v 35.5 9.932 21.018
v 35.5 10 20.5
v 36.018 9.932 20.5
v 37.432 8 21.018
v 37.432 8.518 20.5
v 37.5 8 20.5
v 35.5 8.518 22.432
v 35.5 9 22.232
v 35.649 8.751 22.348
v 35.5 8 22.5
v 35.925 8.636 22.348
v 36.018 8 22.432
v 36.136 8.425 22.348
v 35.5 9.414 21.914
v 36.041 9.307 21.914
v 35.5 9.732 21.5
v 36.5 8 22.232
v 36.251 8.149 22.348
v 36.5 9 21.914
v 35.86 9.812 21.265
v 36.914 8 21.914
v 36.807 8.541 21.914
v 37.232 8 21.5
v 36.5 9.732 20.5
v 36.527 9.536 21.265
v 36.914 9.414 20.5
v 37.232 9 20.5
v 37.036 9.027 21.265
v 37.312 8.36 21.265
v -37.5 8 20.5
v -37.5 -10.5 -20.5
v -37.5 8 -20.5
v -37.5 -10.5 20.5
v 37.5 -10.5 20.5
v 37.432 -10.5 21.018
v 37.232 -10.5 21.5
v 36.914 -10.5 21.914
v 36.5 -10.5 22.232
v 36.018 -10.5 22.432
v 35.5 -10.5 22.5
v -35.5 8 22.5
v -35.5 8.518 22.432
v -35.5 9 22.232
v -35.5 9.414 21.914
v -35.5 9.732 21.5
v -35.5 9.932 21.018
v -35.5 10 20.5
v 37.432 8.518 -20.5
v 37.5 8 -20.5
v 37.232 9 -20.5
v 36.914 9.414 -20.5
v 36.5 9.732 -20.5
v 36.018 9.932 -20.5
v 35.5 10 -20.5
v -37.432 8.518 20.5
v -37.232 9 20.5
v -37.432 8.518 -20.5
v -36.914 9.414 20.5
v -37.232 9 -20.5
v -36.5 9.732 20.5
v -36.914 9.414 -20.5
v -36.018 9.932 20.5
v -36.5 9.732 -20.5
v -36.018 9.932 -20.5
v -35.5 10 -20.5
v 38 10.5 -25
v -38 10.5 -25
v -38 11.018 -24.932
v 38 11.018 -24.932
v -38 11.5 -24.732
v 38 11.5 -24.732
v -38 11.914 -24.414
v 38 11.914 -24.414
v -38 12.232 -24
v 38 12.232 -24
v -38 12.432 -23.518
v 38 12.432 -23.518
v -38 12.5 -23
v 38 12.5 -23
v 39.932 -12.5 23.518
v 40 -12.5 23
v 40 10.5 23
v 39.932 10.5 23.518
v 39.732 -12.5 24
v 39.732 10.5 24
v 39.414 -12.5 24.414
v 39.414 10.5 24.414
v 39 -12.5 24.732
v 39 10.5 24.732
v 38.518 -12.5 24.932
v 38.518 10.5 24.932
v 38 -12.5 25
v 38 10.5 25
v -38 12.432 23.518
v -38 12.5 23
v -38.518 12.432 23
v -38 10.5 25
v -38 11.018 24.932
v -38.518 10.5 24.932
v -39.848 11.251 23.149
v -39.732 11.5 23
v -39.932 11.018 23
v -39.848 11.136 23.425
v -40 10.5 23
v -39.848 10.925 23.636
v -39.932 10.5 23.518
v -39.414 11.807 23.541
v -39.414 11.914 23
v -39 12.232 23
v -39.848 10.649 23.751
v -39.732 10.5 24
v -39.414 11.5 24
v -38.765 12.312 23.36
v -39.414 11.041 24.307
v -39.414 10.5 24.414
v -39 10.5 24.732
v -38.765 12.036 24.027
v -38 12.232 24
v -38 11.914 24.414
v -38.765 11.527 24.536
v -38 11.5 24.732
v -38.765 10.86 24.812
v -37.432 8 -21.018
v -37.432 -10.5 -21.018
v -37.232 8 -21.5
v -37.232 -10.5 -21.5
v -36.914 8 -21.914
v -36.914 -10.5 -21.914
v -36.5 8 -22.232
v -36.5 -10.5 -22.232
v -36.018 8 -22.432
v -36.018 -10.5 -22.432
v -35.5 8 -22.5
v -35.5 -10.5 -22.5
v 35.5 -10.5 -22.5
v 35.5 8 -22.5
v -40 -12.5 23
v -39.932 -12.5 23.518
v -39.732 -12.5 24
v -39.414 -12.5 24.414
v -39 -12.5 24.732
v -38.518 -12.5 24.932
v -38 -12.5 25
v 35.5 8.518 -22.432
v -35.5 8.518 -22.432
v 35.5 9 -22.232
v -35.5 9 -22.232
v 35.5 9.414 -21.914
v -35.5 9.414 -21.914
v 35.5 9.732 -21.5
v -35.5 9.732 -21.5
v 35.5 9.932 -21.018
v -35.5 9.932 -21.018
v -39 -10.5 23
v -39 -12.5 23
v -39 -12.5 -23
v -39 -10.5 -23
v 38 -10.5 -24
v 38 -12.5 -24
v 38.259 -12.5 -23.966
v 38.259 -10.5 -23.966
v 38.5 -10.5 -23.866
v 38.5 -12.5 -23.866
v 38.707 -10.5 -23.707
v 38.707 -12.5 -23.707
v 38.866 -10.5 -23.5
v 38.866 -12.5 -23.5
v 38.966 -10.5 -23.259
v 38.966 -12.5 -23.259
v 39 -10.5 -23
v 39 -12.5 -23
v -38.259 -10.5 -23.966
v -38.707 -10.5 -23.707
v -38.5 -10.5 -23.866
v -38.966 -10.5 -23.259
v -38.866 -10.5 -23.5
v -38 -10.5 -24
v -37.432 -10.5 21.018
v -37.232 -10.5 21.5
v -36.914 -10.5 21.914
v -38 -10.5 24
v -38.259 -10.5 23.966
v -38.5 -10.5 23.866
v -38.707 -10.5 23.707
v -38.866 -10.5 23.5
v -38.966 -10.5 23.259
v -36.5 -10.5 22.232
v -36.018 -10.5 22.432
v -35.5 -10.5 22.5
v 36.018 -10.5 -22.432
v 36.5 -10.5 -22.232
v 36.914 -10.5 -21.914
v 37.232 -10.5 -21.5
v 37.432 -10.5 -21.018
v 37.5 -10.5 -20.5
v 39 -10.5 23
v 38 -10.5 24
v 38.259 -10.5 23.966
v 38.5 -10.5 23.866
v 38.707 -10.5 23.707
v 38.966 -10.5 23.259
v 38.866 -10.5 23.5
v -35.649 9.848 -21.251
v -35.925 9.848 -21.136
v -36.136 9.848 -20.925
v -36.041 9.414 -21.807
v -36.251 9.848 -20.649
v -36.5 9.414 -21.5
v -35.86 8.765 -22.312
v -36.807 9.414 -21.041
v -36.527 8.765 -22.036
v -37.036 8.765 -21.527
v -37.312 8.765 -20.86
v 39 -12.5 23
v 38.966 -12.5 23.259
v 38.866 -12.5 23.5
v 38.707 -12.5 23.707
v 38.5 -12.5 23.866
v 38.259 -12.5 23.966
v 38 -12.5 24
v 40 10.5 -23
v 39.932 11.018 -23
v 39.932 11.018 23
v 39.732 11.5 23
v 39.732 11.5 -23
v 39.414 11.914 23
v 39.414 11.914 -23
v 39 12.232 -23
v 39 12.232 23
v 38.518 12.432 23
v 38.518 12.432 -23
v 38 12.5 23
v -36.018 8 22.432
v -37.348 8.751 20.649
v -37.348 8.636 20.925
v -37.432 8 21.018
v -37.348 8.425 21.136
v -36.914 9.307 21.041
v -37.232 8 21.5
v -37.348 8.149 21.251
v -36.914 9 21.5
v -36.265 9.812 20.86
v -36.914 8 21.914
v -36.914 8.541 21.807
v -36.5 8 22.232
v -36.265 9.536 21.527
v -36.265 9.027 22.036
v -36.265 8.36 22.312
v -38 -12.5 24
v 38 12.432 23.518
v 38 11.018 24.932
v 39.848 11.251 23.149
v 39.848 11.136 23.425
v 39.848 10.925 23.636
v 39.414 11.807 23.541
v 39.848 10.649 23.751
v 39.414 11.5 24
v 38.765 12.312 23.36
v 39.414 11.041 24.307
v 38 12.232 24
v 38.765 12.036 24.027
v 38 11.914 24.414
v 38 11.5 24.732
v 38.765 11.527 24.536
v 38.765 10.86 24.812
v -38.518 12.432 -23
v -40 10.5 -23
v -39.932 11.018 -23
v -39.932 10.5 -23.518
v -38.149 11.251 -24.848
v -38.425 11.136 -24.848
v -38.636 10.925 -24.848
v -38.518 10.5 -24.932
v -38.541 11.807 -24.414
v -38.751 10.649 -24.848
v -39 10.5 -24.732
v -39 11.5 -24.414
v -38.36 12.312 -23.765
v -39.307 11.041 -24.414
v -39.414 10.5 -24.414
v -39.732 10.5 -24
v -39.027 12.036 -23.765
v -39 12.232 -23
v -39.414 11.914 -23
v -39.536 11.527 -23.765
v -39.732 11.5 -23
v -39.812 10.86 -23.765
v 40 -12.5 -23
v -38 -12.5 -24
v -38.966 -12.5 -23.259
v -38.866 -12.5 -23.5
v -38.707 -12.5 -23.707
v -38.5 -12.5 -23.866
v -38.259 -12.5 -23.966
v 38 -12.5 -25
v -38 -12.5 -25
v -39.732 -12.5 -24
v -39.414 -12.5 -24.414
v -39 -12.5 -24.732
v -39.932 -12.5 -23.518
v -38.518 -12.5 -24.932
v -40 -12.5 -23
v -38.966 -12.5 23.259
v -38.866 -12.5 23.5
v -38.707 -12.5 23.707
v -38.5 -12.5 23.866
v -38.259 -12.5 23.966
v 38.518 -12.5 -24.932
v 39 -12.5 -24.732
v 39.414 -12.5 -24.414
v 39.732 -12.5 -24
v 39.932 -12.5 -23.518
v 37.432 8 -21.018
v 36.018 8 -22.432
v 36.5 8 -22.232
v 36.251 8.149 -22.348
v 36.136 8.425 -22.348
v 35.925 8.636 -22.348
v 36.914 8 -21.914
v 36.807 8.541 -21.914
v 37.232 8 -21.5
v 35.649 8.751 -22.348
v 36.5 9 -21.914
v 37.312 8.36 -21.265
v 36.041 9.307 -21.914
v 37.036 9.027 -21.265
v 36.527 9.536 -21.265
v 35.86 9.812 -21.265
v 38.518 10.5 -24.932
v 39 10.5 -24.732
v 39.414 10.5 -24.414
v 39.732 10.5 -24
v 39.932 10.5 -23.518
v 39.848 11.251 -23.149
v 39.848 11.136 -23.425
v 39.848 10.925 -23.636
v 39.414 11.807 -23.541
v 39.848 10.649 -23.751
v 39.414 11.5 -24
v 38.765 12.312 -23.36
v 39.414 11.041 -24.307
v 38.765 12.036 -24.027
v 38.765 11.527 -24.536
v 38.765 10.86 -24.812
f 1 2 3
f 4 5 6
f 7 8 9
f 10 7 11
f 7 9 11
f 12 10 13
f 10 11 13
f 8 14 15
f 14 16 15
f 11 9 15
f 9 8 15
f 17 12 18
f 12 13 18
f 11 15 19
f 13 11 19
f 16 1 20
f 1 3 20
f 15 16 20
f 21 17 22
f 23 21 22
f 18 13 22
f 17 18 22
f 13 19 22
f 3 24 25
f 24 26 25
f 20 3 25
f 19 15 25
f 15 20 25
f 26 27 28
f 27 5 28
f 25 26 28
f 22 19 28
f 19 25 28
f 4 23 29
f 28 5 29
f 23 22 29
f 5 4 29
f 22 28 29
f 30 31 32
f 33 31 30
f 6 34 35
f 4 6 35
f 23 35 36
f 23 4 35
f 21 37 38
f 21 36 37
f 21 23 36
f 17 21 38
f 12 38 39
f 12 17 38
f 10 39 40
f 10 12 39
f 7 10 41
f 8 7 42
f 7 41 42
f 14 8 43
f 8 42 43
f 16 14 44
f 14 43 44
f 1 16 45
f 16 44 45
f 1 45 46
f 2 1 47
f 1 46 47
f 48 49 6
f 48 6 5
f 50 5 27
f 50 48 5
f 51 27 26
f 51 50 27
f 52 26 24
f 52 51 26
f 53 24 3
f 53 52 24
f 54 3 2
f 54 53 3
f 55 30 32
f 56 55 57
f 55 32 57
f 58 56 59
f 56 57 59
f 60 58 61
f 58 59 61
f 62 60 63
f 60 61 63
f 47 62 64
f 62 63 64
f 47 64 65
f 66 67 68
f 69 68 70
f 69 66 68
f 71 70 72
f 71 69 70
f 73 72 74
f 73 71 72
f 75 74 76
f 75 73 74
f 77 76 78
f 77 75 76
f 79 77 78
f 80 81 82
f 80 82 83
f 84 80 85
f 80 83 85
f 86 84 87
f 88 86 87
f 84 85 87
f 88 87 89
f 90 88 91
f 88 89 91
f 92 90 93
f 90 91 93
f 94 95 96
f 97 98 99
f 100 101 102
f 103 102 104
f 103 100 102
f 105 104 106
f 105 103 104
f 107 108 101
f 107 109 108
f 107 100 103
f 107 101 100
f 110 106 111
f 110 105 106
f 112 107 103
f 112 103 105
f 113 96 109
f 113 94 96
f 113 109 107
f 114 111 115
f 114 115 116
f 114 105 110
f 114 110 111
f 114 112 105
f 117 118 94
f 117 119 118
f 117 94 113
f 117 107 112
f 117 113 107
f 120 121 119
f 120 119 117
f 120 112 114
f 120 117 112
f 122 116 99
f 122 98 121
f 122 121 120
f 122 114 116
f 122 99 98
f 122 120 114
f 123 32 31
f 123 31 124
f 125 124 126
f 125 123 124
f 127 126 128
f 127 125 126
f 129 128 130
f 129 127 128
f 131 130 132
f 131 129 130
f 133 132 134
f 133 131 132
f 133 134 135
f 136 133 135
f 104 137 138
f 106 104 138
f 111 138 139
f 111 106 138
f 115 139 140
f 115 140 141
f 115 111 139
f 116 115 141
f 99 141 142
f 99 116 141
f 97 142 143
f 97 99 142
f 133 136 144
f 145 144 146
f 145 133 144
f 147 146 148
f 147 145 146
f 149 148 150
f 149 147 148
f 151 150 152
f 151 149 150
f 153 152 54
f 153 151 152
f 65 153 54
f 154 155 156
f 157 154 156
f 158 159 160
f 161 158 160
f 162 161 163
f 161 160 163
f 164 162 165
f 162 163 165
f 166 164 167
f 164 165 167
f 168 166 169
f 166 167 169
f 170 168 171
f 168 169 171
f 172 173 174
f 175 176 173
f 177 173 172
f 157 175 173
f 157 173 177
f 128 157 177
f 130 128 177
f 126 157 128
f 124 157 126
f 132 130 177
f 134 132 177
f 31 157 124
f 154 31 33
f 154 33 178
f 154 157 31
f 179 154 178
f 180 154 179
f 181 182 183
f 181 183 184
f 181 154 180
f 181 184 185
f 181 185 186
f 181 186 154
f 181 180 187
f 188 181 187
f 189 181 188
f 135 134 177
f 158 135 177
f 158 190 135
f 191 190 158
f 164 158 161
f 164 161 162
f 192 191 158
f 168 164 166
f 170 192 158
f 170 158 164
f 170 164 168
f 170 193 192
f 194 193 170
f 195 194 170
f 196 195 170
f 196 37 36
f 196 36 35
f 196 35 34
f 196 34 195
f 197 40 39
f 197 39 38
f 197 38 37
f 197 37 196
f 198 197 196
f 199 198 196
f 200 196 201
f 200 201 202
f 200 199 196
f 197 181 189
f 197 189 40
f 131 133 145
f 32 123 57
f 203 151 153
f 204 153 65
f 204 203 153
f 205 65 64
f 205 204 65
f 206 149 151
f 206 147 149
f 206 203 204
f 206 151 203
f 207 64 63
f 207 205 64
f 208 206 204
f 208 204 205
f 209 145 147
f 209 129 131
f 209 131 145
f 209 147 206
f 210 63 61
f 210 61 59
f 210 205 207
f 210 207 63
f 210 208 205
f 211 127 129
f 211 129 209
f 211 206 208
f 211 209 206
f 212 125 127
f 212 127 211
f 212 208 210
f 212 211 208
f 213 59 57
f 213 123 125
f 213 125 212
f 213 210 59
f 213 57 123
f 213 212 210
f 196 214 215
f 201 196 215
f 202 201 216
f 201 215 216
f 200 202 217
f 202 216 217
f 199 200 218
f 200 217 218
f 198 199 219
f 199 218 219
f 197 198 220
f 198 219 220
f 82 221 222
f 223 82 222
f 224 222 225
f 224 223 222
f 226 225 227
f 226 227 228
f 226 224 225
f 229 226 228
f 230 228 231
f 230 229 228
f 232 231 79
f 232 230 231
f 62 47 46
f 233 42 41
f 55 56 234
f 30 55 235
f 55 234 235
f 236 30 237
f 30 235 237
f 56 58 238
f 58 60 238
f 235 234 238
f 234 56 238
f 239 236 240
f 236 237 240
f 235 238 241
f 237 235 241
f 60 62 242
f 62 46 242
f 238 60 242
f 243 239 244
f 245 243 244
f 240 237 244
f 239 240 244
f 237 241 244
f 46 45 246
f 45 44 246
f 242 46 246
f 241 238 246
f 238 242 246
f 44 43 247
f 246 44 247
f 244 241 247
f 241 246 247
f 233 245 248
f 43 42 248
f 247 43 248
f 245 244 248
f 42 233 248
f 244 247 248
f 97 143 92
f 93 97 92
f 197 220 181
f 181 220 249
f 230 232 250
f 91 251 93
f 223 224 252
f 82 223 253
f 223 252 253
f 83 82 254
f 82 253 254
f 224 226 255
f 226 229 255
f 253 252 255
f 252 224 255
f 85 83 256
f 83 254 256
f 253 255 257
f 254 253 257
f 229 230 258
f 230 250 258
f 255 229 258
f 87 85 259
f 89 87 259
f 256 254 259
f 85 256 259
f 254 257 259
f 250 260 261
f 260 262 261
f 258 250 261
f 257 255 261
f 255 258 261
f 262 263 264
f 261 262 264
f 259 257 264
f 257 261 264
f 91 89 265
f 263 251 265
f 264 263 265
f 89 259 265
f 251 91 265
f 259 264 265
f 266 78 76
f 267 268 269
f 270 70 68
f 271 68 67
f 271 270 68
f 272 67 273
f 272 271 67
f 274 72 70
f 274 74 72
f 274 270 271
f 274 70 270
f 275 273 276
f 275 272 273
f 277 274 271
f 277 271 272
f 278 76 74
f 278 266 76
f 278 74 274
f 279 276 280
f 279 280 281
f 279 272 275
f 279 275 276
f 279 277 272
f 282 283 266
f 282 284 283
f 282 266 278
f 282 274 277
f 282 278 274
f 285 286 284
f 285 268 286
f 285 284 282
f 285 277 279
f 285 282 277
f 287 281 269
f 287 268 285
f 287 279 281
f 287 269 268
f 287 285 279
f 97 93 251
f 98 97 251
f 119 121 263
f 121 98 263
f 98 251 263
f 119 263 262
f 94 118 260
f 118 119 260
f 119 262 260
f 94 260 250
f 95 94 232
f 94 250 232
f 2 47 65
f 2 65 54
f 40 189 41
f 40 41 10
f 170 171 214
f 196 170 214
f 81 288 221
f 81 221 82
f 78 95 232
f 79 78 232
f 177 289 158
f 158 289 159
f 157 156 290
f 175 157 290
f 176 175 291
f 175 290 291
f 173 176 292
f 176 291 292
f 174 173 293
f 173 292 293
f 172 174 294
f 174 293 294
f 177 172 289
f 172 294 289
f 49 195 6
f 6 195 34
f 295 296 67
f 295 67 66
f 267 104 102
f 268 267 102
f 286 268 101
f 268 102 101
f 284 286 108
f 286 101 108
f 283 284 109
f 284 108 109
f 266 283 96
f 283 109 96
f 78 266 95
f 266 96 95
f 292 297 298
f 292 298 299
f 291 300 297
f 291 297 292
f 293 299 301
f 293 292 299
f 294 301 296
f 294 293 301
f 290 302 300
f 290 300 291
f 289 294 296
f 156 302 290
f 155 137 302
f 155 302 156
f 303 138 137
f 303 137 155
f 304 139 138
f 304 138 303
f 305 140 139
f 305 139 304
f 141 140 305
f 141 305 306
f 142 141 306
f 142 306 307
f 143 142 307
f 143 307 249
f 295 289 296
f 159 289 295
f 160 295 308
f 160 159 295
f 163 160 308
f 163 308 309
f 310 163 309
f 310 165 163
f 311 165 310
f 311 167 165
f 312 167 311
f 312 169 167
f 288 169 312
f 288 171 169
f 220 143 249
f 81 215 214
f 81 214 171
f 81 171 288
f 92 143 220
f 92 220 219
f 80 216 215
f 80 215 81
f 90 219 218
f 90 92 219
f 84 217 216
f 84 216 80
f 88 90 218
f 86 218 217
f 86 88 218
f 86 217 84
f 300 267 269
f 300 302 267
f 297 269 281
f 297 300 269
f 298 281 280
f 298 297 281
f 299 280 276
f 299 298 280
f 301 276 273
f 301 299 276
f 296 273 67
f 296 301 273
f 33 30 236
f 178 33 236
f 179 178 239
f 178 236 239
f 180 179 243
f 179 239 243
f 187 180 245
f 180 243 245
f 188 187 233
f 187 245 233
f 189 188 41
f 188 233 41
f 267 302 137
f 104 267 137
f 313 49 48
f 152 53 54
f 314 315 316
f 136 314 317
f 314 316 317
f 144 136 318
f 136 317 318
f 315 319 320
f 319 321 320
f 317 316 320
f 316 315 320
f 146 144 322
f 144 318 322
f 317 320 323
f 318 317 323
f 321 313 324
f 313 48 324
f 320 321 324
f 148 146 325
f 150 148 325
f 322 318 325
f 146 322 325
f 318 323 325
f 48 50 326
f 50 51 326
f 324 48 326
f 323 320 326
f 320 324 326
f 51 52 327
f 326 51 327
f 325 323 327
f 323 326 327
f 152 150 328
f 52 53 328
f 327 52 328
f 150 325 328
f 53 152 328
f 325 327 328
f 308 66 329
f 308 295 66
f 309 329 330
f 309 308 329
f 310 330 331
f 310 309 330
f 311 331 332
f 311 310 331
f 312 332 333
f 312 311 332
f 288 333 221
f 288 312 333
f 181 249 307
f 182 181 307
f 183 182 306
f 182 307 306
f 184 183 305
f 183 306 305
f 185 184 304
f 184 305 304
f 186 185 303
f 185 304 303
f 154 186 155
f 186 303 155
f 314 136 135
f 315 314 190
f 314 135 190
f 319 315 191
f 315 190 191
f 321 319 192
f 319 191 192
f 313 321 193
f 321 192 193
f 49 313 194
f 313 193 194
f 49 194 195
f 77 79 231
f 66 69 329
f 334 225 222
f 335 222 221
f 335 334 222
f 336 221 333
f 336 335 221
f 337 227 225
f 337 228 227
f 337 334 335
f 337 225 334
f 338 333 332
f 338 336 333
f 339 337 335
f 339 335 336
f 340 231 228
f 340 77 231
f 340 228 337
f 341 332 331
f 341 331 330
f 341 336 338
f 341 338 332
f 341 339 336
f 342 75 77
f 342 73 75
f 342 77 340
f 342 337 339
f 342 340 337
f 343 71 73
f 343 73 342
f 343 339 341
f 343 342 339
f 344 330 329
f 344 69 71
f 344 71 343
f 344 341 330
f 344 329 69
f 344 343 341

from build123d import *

# Parameters (mm, degrees)
F0_W     = 80
F0_H     = 50
F1_DEPTH = 12.5
F2_T     = -2.5
F3_R     = 2
F4_R     = 2
F6_DEPTH = 2


with BuildPart() as f1:
    # F0 (on Front) → F1 (new body, symmetric)
    with BuildSketch(Plane.XZ):
        Rectangle(F0_W, F0_H)
    extrude(amount=F1_DEPTH, both=True)

    # F2
    f2_openings = [f1.faces().sort_by_distance(p)[0] for p in [
        (0, -12.5, 0),
    ]]
    offset(amount=F2_T, openings=f2_openings)

    # F3
    f3_edges = [f1.edges().sort_by_distance(p)[0] for p in [
        (37.5, 10, 0),
        (0, 10, 22.5),
        (37.5, -1.25, 22.5),
        (37.5, -1.25, -22.5),
        (-37.5, -1.25, -22.5),
        (0, 10, -22.5),
        (-37.5, 10, 0),
        (-37.5, -1.25, 22.5),
    ]]
    fillet(f3_edges, radius=F3_R)

    # F4
    f4_edges = [f1.edges().sort_by_distance(p)[0] for p in [
        (0, 12.5, 25),
        (-40, 12.5, 0),
        (0, 12.5, -25),
        (40, 12.5, 0),
        (-40, 0, 25),
        (40, 0, 25),
        (-40, 0, -25),
        (40, 0, -25),
    ]]
    fillet(f4_edges, radius=F4_R)

    # F5 (on face) → F6 (cut)
    with BuildSketch(Plane.XZ.offset(12.5)):
        with BuildLine():
            Line((38, 24), (-38, 24))
            ThreePointArc((-38, 24), (-38.7071067812, 23.7071067812), (-39, 23))
            Line((-39, 23), (-39, -23))
            ThreePointArc((-39, -23), (-38.7071067812, -23.7071067812), (-38, -24))
            Line((-38, -24), (38, -24))
            ThreePointArc((38, -24), (38.7071067812, -23.7071067812), (39, -23))
            Line((39, -23), (39, 23))
            ThreePointArc((39, 23), (38.7071067812, 23.7071067812), (38, 24))
        make_face()
    extrude(amount=-F6_DEPTH, mode=Mode.SUBTRACT)


solid = f1.part
